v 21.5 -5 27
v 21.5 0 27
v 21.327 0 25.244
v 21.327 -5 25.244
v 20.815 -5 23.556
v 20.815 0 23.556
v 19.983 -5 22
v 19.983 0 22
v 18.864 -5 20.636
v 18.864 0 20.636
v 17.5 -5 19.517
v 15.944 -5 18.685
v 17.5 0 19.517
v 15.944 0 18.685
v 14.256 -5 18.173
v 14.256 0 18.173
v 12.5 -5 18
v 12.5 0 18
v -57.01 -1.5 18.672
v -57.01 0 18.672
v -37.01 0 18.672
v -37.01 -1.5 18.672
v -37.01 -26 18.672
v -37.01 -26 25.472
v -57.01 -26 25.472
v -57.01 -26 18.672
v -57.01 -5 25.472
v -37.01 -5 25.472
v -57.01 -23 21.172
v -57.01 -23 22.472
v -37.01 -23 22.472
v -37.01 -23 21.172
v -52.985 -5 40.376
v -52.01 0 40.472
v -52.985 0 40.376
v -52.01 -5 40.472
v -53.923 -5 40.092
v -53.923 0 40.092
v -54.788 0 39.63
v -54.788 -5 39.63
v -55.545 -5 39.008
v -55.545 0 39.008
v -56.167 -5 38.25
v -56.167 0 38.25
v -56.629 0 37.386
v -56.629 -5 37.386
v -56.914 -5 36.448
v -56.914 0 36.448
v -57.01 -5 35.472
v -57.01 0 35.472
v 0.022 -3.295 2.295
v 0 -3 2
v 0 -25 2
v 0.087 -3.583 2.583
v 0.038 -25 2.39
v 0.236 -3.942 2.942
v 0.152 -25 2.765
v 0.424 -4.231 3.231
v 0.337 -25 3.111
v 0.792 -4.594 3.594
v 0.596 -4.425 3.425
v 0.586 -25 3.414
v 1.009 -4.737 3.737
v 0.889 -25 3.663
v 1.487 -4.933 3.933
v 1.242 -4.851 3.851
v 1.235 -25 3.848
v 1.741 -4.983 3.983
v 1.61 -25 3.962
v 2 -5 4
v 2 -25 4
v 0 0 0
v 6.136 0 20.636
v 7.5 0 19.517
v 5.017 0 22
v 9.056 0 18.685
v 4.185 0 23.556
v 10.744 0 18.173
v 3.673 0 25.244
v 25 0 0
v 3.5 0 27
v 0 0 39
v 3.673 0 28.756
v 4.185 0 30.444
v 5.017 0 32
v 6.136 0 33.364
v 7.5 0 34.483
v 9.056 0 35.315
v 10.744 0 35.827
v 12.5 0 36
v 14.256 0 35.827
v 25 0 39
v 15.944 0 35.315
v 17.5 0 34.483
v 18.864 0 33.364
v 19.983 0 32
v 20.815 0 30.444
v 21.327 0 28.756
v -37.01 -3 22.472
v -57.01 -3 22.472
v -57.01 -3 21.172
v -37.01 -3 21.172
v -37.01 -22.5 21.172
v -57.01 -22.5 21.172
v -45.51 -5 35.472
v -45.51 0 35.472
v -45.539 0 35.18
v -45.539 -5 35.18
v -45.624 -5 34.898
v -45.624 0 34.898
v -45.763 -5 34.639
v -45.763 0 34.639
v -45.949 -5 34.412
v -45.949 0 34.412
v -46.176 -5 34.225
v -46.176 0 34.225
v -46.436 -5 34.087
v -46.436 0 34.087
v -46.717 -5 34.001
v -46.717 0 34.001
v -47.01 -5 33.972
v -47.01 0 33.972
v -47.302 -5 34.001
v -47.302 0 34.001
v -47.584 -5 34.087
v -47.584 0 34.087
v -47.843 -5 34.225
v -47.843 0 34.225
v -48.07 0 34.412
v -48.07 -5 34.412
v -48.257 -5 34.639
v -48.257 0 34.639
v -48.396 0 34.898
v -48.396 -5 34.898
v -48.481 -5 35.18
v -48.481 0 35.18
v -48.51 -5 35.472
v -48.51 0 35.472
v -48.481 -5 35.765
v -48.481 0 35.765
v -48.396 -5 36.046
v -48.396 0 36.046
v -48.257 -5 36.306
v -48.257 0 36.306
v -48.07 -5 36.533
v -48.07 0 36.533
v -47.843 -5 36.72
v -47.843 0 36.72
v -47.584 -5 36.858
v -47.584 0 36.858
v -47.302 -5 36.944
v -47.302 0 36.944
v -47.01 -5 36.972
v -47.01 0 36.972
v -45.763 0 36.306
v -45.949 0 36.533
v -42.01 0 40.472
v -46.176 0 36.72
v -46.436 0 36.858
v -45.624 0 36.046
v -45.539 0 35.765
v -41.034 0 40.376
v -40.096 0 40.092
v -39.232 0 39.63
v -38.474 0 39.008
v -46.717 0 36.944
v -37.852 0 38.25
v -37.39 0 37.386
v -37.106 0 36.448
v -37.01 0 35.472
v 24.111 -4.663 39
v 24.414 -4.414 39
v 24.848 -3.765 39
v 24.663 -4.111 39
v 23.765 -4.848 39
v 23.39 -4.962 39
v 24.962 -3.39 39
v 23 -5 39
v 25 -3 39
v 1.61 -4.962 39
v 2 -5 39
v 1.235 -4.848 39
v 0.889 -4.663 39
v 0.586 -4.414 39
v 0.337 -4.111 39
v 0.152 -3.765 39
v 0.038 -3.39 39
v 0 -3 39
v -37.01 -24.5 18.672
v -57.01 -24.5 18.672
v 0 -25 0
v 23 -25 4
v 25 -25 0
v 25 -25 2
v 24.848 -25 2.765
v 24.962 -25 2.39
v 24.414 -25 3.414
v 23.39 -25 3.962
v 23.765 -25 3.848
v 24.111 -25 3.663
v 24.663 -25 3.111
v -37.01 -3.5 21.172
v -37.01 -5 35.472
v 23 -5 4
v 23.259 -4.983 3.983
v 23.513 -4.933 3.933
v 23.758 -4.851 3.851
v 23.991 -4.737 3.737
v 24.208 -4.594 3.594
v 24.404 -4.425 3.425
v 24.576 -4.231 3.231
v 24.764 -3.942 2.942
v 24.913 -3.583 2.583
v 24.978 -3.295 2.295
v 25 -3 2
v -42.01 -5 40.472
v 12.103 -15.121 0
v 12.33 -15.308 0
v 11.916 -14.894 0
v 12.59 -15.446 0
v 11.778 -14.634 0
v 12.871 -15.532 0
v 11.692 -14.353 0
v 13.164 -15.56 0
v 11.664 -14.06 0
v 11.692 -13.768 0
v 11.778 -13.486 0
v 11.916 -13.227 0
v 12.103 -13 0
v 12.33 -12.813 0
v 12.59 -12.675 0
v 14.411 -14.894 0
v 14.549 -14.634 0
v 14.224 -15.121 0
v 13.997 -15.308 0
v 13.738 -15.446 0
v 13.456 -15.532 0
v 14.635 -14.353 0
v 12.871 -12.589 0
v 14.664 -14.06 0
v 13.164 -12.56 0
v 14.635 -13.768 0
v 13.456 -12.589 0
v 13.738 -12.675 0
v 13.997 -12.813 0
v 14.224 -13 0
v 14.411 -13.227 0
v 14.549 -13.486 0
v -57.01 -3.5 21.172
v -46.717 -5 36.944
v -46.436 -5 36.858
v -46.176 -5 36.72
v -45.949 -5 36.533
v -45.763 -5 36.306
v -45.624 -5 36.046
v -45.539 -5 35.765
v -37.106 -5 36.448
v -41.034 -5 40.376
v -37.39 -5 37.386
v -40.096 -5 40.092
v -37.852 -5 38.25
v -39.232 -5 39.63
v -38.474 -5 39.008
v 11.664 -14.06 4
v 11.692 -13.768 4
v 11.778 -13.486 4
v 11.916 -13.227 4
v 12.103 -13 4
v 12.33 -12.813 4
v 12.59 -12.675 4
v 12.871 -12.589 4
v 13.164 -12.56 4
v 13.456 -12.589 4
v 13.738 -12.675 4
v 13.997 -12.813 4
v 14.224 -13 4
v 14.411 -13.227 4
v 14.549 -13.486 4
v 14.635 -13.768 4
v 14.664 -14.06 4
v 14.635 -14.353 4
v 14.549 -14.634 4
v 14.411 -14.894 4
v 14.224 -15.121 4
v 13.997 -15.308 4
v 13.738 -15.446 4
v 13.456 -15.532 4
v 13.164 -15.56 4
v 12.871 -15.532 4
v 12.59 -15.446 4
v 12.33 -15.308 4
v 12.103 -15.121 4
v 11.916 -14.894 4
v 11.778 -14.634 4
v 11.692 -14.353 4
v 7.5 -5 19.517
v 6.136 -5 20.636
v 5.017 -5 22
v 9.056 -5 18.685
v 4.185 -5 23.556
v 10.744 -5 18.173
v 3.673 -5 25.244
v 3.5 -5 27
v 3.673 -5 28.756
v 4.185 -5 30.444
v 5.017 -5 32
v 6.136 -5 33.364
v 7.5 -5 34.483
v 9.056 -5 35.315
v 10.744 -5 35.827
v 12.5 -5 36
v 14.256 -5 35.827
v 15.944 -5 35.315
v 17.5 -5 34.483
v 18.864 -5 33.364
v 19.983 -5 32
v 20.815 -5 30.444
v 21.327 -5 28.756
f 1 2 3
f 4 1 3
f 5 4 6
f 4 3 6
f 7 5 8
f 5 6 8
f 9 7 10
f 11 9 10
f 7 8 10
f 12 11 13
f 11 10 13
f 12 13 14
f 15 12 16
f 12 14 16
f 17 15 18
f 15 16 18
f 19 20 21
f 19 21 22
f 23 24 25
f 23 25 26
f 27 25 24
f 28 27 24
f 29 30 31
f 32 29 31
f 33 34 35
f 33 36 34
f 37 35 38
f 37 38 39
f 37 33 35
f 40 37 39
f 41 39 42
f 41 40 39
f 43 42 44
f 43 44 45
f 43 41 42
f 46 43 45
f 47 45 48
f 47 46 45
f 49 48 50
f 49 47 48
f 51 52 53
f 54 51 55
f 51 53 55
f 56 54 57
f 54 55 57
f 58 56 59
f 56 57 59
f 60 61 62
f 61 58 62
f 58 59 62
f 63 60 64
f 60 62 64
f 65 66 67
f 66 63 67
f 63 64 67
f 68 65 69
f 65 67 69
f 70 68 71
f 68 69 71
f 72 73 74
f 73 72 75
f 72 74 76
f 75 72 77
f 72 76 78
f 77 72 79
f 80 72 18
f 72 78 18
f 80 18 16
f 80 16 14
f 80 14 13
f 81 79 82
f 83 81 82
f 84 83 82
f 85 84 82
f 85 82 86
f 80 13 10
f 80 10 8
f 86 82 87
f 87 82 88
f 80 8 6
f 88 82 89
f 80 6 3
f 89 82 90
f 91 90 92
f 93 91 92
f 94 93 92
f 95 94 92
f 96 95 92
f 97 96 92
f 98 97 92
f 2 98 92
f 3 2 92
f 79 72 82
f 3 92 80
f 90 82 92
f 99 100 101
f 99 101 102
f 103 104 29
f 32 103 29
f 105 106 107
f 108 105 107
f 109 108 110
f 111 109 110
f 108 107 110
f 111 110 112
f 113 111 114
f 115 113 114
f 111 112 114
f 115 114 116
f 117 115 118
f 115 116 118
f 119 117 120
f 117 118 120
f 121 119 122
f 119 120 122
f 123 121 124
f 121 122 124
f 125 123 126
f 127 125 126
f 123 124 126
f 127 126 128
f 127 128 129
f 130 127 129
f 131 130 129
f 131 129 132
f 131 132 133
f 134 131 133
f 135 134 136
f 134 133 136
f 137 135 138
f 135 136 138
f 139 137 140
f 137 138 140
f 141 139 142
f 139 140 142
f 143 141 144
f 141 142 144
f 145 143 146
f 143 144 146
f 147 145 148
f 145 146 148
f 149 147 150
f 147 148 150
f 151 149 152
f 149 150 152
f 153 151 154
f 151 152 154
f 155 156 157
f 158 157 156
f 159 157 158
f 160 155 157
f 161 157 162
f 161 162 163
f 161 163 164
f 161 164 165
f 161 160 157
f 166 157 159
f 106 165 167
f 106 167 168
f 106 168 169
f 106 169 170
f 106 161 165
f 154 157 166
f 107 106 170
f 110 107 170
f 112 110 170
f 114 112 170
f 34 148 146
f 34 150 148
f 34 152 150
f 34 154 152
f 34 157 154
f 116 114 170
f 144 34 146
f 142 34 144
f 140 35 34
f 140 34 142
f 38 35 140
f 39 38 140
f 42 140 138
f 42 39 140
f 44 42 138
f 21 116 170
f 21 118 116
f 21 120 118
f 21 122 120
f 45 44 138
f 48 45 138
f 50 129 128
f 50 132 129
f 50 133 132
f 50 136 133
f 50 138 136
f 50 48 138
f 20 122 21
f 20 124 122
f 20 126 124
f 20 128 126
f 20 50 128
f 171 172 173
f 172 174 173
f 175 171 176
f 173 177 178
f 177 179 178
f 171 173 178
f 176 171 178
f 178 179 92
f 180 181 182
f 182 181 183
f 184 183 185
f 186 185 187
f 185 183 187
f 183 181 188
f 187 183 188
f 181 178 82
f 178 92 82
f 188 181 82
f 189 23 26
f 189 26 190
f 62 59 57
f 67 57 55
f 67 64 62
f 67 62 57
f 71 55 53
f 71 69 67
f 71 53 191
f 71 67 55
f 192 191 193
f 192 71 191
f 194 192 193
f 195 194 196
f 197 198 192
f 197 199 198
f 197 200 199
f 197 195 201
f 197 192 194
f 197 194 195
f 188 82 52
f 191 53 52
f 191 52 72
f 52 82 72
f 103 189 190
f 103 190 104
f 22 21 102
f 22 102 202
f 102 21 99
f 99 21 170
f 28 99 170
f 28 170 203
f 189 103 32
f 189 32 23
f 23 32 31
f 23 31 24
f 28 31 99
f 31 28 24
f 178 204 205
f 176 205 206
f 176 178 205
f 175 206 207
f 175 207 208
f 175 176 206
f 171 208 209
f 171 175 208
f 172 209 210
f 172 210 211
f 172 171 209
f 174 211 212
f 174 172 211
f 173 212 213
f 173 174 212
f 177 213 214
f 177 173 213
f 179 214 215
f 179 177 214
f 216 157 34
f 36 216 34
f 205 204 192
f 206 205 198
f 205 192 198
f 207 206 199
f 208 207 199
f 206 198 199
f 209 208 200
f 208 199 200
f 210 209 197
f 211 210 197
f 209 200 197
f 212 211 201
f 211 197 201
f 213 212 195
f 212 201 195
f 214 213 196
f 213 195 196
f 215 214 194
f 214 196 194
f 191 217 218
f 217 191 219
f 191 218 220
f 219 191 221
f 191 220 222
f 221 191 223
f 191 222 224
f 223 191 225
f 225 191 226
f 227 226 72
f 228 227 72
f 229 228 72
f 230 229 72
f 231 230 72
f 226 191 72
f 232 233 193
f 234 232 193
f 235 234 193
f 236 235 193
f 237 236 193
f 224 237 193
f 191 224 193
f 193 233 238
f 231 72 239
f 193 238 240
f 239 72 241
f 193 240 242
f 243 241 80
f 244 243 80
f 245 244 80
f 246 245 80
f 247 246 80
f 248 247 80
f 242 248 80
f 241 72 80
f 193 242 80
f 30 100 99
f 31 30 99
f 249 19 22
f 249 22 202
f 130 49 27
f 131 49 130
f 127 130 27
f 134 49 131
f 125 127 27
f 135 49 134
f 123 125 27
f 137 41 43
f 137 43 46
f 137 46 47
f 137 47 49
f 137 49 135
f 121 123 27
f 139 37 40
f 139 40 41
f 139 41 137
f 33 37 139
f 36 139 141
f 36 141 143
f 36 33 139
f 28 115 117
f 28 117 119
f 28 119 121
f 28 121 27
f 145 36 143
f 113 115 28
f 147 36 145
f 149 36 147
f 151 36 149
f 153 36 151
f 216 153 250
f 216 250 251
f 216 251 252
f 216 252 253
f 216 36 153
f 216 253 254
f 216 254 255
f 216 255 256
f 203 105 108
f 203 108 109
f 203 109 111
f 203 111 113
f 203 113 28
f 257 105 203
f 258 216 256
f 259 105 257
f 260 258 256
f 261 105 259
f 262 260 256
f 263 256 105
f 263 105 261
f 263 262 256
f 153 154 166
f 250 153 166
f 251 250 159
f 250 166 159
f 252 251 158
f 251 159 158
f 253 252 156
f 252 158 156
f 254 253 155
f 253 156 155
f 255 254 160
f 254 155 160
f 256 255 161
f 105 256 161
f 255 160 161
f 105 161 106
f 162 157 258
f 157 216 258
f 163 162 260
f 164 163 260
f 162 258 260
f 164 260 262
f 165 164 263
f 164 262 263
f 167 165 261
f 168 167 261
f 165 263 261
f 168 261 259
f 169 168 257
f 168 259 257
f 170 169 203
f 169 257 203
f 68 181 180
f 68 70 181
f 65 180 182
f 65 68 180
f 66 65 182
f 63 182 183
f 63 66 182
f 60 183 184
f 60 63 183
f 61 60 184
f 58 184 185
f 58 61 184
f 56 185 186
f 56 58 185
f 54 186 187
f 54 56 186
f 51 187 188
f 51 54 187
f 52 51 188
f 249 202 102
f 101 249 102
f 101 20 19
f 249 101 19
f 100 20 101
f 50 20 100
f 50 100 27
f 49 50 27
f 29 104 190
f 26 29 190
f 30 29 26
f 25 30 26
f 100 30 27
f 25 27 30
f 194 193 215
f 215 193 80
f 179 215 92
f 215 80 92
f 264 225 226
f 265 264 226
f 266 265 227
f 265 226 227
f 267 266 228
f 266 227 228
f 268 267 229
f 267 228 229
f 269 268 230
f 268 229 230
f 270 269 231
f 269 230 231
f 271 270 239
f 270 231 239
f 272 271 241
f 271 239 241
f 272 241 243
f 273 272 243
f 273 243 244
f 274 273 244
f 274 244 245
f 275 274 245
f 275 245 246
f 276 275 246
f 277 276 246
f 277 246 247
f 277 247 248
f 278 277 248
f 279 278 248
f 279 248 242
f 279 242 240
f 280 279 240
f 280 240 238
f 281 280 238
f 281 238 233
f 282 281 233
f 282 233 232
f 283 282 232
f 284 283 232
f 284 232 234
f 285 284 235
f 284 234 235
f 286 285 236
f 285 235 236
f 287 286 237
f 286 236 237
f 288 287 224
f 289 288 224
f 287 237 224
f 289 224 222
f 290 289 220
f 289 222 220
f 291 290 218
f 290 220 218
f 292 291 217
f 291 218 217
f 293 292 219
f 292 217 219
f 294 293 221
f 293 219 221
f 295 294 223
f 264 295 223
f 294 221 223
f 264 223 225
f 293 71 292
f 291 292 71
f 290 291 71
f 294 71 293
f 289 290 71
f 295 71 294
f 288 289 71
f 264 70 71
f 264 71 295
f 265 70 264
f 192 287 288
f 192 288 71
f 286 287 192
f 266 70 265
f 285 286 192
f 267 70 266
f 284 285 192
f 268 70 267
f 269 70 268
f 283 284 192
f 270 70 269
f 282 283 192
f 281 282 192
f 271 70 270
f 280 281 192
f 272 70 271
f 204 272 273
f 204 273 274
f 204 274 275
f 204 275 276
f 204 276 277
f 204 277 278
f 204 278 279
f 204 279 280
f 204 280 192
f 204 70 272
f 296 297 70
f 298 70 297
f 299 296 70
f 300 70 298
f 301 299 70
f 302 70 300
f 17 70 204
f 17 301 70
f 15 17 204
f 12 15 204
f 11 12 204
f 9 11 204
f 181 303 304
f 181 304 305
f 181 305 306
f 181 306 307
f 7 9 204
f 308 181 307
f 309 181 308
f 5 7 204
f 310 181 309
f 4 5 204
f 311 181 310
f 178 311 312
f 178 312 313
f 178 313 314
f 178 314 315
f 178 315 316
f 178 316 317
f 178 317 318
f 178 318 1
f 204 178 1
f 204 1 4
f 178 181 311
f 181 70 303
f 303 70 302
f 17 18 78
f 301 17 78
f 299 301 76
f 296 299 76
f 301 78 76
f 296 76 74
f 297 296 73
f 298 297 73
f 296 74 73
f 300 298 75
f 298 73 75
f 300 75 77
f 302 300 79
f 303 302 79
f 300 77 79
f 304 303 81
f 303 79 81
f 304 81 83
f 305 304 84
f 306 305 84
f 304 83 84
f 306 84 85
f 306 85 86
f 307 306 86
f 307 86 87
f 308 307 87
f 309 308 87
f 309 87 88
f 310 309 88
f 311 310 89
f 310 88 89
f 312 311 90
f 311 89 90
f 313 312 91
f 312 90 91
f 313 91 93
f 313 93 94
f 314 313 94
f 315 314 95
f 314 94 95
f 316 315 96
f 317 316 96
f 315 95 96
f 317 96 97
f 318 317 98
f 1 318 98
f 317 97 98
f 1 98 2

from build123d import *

# Parameters (mm, degrees)
F1_DEPTH  = 5
F0_W      = 20
F0_H      = 3
F2_DEPTH  = 26
F0_H_2    = 1.3
F3_DEPTH  = 3
F4_W      = 20
F4_H      = 3
F5_DEPTH  = 1.3
F8_DEPTH  = 20
F9_DEPTH  = 20
F10_R     = 5
F11_R     = 5
F12_W     = 25
F12_H     = 4
F13_DEPTH = 25
F14_DEPTH = 5
F16_D     = 3
F17_R     = 2
F18_R     = 2


with BuildPart() as f1:
    # F0 (on Front) → F1 (new body)
    with BuildSketch(Plane.XZ):
        Polygon((-47.009775, 40.472453), (-57.009775, 40.472453), (-57.009775, 25.472453), (-37.009775, 25.472453), (-37.009775, 40.472453), align=None)
        with BuildLine():
            ThreePointArc((-45.509775, 35.472453), (-48.070435, 34.411793), (-47.009775, 36.972453))
            ThreePointArc((-47.009775, 36.972453), (-45.949115, 36.533113), (-45.509775, 35.472453))
        make_face(mode=Mode.SUBTRACT)
    extrude(amount=F1_DEPTH)

    # F0 (on Front) → F2 (join)
    with BuildSketch(Plane.XZ):
        with Locations((-47.009775, 23.972453)):
            Rectangle(F0_W, F0_H)
    extrude(amount=F2_DEPTH)

    # F0 (on Front) → F3 (join)
    with BuildSketch(Plane.XZ):
        with Locations((-47.009775, 21.822453)):
            Rectangle(F0_W, F0_H_2)
    extrude(amount=F3_DEPTH)

    # F4 (on face) → F5 (join)
    with BuildSketch(Plane(origin=(0, 0, 22.472453), x_dir=(1, 0, 0), z_dir=(0, 0, -1))):
        with Locations((-47.009775, 24.5)):
            Rectangle(F4_W, F4_H)
    extrude(amount=F5_DEPTH)

    # F6 (on face) → F8 (join)
    with BuildSketch(Plane.YZ.offset(-37.009775)):
        Polygon((-23, 21.172453), (-26, 21.172453), (-26, 18.672453), (-24.5, 18.672453), (-22.5, 21.172453), align=None)
    extrude(amount=-F8_DEPTH)

    # F7 (on face) → F9 (join)
    with BuildSketch(Plane(origin=(-57.009775, 0, 0), x_dir=(0, -1, 0), z_dir=(-1, 0, 0))):
        Polygon((3.5, 21.172453), (3, 21.172453), (0, 21.172453), (0, 18.672453), (1.5, 18.672453), align=None)
    extrude(amount=-F9_DEPTH)

    # F10
    f10_edges = [f1.edges().sort_by_distance(p)[0] for p in [
        (-57.009775, -2.5, 40.472453),
    ]]
    fillet(f10_edges, radius=F10_R)

    # F11
    f11_edges = [f1.edges().sort_by_distance(p)[0] for p in [
        (-37.009775, -2.5, 40.472453),
    ]]
    fillet(f11_edges, radius=F11_R)


with BuildPart() as f13:
    # F12 (on Front) → F13 (new body)
    with BuildSketch(Plane.XZ):
        with Locations((12.5, 2)):
            Rectangle(F12_W, F12_H)
    extrude(amount=F13_DEPTH)

    # F12 (on Front) → F14 (join)
    with BuildSketch(Plane.XZ):
        Polygon((0, 18), (0, 4), (25, 4), (25, 39), (0, 39), align=None)
        with BuildLine():
            ThreePointArc((21.5, 27), (18.863961, 20.636039), (12.5, 18))
            ThreePointArc((12.5, 18), (6.136039, 33.363961), (21.5, 27))
        make_face(mode=Mode.SUBTRACT)
    extrude(amount=F14_DEPTH)

    # F16 (through all)
    with Locations(Plane.XY.offset(4)):
        with Locations((13.16359, -14.060337)):
            Hole(F16_D / 2)

    # F17
    f17_edges = [f13.edges().sort_by_distance(p)[0] for p in [
        (25, -15, 4),
        (25, -5, 21.5),
    ]]
    fillet(f17_edges, radius=F17_R)

    # F18
    f18_edges = [f13.edges().sort_by_distance(p)[0] for p in [
        (0, -5, 21.5),
        (0, -15, 4),
    ]]
    fillet(f18_edges, radius=F18_R)


solid = Compound([f1.part, f13.part])
